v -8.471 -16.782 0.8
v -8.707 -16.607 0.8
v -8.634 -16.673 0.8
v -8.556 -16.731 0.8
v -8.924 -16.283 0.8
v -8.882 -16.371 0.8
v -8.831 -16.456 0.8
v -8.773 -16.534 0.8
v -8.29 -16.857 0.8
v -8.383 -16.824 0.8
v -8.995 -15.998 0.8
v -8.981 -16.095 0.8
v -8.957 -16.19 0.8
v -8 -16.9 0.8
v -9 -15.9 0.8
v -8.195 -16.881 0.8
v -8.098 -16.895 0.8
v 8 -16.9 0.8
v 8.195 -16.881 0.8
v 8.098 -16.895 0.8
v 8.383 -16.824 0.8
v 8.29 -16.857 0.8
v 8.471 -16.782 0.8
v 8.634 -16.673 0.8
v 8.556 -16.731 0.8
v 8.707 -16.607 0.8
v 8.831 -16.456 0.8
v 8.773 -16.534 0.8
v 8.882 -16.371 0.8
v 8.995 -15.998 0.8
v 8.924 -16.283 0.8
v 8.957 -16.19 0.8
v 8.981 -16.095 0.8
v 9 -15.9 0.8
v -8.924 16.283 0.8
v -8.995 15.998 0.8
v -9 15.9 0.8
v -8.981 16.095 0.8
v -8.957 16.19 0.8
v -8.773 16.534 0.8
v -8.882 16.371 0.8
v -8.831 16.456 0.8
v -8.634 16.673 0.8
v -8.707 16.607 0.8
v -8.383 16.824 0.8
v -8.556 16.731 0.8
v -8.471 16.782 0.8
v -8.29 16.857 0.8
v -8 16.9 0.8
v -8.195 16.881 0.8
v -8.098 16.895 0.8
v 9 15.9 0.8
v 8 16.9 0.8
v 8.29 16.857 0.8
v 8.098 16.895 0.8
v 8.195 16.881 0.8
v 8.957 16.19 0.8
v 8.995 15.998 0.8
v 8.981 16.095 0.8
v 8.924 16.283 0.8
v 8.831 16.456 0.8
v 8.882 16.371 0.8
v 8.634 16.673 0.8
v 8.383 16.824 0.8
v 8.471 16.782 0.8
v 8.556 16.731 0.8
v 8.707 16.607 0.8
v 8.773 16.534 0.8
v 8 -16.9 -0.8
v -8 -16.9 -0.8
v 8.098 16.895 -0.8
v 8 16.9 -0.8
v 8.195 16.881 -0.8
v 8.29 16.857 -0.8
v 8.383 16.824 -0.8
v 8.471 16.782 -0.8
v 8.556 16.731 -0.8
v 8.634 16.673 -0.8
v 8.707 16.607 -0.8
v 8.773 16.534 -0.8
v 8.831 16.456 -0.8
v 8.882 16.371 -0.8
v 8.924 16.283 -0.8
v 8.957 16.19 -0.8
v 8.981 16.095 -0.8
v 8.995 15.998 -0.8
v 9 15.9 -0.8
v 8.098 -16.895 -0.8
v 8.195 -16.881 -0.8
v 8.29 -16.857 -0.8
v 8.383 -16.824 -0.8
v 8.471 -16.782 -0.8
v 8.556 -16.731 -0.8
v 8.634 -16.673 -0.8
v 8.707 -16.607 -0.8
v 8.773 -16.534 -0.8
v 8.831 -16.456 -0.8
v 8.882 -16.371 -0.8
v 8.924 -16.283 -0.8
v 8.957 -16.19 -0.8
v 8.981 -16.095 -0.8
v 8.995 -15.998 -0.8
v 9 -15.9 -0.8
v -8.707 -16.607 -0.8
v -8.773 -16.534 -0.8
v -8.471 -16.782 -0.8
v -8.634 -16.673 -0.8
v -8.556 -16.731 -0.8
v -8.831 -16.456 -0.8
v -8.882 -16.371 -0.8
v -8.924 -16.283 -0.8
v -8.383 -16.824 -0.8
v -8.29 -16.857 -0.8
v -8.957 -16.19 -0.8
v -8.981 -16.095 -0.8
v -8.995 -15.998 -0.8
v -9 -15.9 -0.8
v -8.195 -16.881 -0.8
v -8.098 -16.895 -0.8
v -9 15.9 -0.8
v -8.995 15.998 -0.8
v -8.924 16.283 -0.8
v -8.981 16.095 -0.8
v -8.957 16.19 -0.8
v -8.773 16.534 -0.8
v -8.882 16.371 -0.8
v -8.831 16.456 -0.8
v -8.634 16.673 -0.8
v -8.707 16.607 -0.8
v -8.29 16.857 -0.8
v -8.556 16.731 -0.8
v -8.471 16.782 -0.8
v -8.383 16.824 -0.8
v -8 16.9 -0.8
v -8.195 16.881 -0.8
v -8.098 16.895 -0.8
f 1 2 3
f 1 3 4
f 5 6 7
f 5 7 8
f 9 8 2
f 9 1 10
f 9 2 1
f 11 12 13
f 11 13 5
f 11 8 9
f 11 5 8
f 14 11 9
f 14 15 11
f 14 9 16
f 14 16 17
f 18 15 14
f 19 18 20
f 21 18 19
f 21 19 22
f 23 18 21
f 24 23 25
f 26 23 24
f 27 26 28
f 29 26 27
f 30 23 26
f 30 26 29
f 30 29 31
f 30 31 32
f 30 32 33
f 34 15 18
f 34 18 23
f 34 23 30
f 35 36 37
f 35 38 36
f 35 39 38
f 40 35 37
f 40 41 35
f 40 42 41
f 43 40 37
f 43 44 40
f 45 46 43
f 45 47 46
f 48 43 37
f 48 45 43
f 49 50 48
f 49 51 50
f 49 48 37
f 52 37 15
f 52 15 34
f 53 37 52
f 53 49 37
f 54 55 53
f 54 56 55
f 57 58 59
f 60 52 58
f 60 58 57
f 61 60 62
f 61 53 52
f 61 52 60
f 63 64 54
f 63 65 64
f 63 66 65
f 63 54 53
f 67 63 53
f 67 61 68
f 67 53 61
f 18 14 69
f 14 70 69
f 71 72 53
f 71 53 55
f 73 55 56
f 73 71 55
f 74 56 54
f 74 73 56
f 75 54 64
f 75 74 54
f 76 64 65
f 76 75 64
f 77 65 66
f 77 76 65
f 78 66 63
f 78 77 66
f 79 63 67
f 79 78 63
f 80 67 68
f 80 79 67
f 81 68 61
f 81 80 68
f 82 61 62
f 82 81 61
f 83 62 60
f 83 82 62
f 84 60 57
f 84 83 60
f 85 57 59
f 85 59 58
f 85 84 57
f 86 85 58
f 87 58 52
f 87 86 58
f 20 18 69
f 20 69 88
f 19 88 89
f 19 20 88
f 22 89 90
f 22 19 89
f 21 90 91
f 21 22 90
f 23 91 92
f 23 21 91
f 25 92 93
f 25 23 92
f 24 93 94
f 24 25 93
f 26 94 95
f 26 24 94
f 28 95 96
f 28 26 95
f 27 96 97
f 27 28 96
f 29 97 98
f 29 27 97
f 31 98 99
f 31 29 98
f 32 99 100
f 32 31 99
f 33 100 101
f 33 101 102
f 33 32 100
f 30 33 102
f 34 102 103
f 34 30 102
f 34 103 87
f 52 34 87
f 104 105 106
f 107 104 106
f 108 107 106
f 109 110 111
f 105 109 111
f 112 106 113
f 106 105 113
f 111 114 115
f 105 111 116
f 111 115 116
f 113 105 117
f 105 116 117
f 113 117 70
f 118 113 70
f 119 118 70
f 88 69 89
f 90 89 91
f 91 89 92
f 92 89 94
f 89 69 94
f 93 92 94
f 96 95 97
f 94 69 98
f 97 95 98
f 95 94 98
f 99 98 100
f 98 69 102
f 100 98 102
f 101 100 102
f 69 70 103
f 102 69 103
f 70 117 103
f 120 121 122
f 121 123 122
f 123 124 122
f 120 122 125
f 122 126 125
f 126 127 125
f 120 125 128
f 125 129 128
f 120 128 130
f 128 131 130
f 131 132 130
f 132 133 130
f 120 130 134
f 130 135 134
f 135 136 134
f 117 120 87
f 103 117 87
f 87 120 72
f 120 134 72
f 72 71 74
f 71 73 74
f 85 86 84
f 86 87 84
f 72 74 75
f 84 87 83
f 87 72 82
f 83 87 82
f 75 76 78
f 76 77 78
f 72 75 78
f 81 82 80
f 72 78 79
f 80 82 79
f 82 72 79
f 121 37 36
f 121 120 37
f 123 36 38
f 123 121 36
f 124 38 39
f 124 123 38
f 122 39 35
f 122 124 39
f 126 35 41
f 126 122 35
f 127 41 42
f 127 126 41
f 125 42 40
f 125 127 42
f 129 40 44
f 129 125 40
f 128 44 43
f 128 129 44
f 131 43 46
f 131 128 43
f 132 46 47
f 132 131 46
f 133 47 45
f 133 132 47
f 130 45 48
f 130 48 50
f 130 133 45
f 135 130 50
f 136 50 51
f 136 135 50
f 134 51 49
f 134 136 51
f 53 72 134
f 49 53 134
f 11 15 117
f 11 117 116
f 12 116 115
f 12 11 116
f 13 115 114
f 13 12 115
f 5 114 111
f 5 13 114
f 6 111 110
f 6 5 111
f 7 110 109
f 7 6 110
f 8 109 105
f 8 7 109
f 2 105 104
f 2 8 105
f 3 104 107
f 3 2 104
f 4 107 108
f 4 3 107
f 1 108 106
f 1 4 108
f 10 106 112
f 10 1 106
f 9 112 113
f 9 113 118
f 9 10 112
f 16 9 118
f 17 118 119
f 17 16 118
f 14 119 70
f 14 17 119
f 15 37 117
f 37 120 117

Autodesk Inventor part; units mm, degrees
ref_plane "YZ Plane" through (0, 0, 0) normal (1, 0, 0) x (0, 1, 0)
ref_plane "XZ Plane" through (0, 0, 0) normal (0, 1, 0) x (-1, 0, 0)
ref_plane "XY Plane" through (0, 0, 0) normal (0, 0, 1) x (1, 0, 0)
sketch "Sketch1" plane through (0, 0, 0) normal (0, 0, 1) x (1, 0, 0)
  line L0 (-9, -16.9) -> (9, -16.9)
  line L1 (9, -16.9) -> (9, 16.9)
  line L2 (9, 16.9) -> (-9, 16.9)
  line L3 (-9, 16.9) -> (-9, -16.9)
  line L4 (-9, -16.9) -> (9, 16.9) construction
  line L5 (9, -16.9) -> (-9, 16.9) construction
  point P0 (0, 0)
  dimension "d0" = 18
  dimension "d1" = 33.8
extrude "Extrusion1" add sketch "Sketch1" along normal mid plane 1.6
fillet "Fillet1" radius 1 4 edges at (-9, -16.9, 0) (9, -16.9, 0) (9, 16.9, 0) (-9, 16.9, 0)
sketch "USB_MAIN_EXTENSION_PCB_OUTLINE" plane through (0, 0, 0.8) normal (0, 0, 1) x (1, 0, 0)
  arc A0 (-8, 16.9) -> (-9, 15.9) centre (-8, 15.9) ccw projected
  line L0 (-9, 15.9) -> (-9, -15.9) projected
  arc A1 (-9, -15.9) -> (-8, -16.9) centre (-8, -15.9) ccw projected
  line L1 (-8, -16.9) -> (8, -16.9) projected
  arc A2 (8, -16.9) -> (9, -15.9) centre (8, -15.9) ccw projected
  line L2 (9, -15.9) -> (9, 15.9) projected
  arc A3 (9, 15.9) -> (8, 16.9) centre (8, 15.9) ccw projected
  line L3 (8, 16.9) -> (-8, 16.9) projected
  line L4 (7, 13.9) -> (7, 8.515)
  line L5 (7, 8.485) -> (7, 3.1)
  line L6 (7, -3.1) -> (7, -8.485)
  line L7 (7, -8.515) -> (7, -13.9)
  line L8 (3.15, -14.5) -> (4.75, -14.5)
  line L9 (4.75, -14.2) -> (3.15, -14.2)
  line L10 (4.95, -14.5) -> (4.95, -14.2)
  line L11 (2.95, -14.2) -> (2.95, -14.5)
  line L12 (4.75, -2.5) -> (3.15, -2.5)
  line L13 (3.15, -2.8) -> (4.75, -2.8)
  line L14 (4.95, -2.8) -> (4.95, -2.5)
  line L15 (2.95, -2.5) -> (2.95, -2.8)
  line L16 (4.75, 2.8) -> (3.15, 2.8)
  line L17 (3.15, 2.5) -> (4.75, 2.5)
  line L18 (4.95, 2.5) -> (4.95, 2.8)
  line L19 (2.95, 2.8) -> (2.95, 2.5)
  line L20 (4.75, 14.5) -> (3.15, 14.5)
  line L21 (3.15, 14.2) -> (4.75, 14.2)
  line L22 (4.95, 14.2) -> (4.95, 14.5)
  line L23 (2.95, 14.5) -> (2.95, 14.2)
  line L24 (2.2526, 12.7) -> (1.15, 12.7)
  line L25 (1.05, 12.4) -> (1.05, 12.6)
  line L26 (1.15, 4.3) -> (2.2526, 4.3)
  line L27 (1.05, 4.4) -> (1.05, 4.6)
  line L28 (2.2526, -4.3) -> (1.15, -4.3)
  line L29 (1.05, -4.6) -> (1.05, -4.4)
  line L30 (1.15, -12.7) -> (2.2526, -12.7)
  line L31 (1.05, -12.6) -> (1.05, -12.4)
  circle A4 centre (3.95, -2.65) radius 1
  circle A5 centre (3.95, -14.35) radius 1
  circle A6 centre (3.95, 2.65) radius 1
  circle A7 centre (3.95, 14.35) radius 1
  line L32 (-6.755, -9.254) -> (-6.755, -8.746)
  line L33 (-6.247, -8.746) -> (-6.755, -8.746)
  line L34 (-6.247, -9.254) -> (-6.247, -8.746)
  line L35 (-6.755, -9.254) -> (-6.247, -9.254)
  line L36 (-4.755, 8.746) -> (-4.755, 9.254)
  line L37 (-4.247, 8.746) -> (-4.755, 8.746)
  line L38 (-4.247, 8.746) -> (-4.247, 9.254)
  line L39 (-4.247, 9.254) -> (-4.755, 9.254)
  circle A8 centre (-4.501, 9) radius 0.254
  circle A9 centre (-6.501, -9) radius 0.254
  point P0 (0, 0)
properties part number "USB_MAIN_EXTENSION_PCB"
